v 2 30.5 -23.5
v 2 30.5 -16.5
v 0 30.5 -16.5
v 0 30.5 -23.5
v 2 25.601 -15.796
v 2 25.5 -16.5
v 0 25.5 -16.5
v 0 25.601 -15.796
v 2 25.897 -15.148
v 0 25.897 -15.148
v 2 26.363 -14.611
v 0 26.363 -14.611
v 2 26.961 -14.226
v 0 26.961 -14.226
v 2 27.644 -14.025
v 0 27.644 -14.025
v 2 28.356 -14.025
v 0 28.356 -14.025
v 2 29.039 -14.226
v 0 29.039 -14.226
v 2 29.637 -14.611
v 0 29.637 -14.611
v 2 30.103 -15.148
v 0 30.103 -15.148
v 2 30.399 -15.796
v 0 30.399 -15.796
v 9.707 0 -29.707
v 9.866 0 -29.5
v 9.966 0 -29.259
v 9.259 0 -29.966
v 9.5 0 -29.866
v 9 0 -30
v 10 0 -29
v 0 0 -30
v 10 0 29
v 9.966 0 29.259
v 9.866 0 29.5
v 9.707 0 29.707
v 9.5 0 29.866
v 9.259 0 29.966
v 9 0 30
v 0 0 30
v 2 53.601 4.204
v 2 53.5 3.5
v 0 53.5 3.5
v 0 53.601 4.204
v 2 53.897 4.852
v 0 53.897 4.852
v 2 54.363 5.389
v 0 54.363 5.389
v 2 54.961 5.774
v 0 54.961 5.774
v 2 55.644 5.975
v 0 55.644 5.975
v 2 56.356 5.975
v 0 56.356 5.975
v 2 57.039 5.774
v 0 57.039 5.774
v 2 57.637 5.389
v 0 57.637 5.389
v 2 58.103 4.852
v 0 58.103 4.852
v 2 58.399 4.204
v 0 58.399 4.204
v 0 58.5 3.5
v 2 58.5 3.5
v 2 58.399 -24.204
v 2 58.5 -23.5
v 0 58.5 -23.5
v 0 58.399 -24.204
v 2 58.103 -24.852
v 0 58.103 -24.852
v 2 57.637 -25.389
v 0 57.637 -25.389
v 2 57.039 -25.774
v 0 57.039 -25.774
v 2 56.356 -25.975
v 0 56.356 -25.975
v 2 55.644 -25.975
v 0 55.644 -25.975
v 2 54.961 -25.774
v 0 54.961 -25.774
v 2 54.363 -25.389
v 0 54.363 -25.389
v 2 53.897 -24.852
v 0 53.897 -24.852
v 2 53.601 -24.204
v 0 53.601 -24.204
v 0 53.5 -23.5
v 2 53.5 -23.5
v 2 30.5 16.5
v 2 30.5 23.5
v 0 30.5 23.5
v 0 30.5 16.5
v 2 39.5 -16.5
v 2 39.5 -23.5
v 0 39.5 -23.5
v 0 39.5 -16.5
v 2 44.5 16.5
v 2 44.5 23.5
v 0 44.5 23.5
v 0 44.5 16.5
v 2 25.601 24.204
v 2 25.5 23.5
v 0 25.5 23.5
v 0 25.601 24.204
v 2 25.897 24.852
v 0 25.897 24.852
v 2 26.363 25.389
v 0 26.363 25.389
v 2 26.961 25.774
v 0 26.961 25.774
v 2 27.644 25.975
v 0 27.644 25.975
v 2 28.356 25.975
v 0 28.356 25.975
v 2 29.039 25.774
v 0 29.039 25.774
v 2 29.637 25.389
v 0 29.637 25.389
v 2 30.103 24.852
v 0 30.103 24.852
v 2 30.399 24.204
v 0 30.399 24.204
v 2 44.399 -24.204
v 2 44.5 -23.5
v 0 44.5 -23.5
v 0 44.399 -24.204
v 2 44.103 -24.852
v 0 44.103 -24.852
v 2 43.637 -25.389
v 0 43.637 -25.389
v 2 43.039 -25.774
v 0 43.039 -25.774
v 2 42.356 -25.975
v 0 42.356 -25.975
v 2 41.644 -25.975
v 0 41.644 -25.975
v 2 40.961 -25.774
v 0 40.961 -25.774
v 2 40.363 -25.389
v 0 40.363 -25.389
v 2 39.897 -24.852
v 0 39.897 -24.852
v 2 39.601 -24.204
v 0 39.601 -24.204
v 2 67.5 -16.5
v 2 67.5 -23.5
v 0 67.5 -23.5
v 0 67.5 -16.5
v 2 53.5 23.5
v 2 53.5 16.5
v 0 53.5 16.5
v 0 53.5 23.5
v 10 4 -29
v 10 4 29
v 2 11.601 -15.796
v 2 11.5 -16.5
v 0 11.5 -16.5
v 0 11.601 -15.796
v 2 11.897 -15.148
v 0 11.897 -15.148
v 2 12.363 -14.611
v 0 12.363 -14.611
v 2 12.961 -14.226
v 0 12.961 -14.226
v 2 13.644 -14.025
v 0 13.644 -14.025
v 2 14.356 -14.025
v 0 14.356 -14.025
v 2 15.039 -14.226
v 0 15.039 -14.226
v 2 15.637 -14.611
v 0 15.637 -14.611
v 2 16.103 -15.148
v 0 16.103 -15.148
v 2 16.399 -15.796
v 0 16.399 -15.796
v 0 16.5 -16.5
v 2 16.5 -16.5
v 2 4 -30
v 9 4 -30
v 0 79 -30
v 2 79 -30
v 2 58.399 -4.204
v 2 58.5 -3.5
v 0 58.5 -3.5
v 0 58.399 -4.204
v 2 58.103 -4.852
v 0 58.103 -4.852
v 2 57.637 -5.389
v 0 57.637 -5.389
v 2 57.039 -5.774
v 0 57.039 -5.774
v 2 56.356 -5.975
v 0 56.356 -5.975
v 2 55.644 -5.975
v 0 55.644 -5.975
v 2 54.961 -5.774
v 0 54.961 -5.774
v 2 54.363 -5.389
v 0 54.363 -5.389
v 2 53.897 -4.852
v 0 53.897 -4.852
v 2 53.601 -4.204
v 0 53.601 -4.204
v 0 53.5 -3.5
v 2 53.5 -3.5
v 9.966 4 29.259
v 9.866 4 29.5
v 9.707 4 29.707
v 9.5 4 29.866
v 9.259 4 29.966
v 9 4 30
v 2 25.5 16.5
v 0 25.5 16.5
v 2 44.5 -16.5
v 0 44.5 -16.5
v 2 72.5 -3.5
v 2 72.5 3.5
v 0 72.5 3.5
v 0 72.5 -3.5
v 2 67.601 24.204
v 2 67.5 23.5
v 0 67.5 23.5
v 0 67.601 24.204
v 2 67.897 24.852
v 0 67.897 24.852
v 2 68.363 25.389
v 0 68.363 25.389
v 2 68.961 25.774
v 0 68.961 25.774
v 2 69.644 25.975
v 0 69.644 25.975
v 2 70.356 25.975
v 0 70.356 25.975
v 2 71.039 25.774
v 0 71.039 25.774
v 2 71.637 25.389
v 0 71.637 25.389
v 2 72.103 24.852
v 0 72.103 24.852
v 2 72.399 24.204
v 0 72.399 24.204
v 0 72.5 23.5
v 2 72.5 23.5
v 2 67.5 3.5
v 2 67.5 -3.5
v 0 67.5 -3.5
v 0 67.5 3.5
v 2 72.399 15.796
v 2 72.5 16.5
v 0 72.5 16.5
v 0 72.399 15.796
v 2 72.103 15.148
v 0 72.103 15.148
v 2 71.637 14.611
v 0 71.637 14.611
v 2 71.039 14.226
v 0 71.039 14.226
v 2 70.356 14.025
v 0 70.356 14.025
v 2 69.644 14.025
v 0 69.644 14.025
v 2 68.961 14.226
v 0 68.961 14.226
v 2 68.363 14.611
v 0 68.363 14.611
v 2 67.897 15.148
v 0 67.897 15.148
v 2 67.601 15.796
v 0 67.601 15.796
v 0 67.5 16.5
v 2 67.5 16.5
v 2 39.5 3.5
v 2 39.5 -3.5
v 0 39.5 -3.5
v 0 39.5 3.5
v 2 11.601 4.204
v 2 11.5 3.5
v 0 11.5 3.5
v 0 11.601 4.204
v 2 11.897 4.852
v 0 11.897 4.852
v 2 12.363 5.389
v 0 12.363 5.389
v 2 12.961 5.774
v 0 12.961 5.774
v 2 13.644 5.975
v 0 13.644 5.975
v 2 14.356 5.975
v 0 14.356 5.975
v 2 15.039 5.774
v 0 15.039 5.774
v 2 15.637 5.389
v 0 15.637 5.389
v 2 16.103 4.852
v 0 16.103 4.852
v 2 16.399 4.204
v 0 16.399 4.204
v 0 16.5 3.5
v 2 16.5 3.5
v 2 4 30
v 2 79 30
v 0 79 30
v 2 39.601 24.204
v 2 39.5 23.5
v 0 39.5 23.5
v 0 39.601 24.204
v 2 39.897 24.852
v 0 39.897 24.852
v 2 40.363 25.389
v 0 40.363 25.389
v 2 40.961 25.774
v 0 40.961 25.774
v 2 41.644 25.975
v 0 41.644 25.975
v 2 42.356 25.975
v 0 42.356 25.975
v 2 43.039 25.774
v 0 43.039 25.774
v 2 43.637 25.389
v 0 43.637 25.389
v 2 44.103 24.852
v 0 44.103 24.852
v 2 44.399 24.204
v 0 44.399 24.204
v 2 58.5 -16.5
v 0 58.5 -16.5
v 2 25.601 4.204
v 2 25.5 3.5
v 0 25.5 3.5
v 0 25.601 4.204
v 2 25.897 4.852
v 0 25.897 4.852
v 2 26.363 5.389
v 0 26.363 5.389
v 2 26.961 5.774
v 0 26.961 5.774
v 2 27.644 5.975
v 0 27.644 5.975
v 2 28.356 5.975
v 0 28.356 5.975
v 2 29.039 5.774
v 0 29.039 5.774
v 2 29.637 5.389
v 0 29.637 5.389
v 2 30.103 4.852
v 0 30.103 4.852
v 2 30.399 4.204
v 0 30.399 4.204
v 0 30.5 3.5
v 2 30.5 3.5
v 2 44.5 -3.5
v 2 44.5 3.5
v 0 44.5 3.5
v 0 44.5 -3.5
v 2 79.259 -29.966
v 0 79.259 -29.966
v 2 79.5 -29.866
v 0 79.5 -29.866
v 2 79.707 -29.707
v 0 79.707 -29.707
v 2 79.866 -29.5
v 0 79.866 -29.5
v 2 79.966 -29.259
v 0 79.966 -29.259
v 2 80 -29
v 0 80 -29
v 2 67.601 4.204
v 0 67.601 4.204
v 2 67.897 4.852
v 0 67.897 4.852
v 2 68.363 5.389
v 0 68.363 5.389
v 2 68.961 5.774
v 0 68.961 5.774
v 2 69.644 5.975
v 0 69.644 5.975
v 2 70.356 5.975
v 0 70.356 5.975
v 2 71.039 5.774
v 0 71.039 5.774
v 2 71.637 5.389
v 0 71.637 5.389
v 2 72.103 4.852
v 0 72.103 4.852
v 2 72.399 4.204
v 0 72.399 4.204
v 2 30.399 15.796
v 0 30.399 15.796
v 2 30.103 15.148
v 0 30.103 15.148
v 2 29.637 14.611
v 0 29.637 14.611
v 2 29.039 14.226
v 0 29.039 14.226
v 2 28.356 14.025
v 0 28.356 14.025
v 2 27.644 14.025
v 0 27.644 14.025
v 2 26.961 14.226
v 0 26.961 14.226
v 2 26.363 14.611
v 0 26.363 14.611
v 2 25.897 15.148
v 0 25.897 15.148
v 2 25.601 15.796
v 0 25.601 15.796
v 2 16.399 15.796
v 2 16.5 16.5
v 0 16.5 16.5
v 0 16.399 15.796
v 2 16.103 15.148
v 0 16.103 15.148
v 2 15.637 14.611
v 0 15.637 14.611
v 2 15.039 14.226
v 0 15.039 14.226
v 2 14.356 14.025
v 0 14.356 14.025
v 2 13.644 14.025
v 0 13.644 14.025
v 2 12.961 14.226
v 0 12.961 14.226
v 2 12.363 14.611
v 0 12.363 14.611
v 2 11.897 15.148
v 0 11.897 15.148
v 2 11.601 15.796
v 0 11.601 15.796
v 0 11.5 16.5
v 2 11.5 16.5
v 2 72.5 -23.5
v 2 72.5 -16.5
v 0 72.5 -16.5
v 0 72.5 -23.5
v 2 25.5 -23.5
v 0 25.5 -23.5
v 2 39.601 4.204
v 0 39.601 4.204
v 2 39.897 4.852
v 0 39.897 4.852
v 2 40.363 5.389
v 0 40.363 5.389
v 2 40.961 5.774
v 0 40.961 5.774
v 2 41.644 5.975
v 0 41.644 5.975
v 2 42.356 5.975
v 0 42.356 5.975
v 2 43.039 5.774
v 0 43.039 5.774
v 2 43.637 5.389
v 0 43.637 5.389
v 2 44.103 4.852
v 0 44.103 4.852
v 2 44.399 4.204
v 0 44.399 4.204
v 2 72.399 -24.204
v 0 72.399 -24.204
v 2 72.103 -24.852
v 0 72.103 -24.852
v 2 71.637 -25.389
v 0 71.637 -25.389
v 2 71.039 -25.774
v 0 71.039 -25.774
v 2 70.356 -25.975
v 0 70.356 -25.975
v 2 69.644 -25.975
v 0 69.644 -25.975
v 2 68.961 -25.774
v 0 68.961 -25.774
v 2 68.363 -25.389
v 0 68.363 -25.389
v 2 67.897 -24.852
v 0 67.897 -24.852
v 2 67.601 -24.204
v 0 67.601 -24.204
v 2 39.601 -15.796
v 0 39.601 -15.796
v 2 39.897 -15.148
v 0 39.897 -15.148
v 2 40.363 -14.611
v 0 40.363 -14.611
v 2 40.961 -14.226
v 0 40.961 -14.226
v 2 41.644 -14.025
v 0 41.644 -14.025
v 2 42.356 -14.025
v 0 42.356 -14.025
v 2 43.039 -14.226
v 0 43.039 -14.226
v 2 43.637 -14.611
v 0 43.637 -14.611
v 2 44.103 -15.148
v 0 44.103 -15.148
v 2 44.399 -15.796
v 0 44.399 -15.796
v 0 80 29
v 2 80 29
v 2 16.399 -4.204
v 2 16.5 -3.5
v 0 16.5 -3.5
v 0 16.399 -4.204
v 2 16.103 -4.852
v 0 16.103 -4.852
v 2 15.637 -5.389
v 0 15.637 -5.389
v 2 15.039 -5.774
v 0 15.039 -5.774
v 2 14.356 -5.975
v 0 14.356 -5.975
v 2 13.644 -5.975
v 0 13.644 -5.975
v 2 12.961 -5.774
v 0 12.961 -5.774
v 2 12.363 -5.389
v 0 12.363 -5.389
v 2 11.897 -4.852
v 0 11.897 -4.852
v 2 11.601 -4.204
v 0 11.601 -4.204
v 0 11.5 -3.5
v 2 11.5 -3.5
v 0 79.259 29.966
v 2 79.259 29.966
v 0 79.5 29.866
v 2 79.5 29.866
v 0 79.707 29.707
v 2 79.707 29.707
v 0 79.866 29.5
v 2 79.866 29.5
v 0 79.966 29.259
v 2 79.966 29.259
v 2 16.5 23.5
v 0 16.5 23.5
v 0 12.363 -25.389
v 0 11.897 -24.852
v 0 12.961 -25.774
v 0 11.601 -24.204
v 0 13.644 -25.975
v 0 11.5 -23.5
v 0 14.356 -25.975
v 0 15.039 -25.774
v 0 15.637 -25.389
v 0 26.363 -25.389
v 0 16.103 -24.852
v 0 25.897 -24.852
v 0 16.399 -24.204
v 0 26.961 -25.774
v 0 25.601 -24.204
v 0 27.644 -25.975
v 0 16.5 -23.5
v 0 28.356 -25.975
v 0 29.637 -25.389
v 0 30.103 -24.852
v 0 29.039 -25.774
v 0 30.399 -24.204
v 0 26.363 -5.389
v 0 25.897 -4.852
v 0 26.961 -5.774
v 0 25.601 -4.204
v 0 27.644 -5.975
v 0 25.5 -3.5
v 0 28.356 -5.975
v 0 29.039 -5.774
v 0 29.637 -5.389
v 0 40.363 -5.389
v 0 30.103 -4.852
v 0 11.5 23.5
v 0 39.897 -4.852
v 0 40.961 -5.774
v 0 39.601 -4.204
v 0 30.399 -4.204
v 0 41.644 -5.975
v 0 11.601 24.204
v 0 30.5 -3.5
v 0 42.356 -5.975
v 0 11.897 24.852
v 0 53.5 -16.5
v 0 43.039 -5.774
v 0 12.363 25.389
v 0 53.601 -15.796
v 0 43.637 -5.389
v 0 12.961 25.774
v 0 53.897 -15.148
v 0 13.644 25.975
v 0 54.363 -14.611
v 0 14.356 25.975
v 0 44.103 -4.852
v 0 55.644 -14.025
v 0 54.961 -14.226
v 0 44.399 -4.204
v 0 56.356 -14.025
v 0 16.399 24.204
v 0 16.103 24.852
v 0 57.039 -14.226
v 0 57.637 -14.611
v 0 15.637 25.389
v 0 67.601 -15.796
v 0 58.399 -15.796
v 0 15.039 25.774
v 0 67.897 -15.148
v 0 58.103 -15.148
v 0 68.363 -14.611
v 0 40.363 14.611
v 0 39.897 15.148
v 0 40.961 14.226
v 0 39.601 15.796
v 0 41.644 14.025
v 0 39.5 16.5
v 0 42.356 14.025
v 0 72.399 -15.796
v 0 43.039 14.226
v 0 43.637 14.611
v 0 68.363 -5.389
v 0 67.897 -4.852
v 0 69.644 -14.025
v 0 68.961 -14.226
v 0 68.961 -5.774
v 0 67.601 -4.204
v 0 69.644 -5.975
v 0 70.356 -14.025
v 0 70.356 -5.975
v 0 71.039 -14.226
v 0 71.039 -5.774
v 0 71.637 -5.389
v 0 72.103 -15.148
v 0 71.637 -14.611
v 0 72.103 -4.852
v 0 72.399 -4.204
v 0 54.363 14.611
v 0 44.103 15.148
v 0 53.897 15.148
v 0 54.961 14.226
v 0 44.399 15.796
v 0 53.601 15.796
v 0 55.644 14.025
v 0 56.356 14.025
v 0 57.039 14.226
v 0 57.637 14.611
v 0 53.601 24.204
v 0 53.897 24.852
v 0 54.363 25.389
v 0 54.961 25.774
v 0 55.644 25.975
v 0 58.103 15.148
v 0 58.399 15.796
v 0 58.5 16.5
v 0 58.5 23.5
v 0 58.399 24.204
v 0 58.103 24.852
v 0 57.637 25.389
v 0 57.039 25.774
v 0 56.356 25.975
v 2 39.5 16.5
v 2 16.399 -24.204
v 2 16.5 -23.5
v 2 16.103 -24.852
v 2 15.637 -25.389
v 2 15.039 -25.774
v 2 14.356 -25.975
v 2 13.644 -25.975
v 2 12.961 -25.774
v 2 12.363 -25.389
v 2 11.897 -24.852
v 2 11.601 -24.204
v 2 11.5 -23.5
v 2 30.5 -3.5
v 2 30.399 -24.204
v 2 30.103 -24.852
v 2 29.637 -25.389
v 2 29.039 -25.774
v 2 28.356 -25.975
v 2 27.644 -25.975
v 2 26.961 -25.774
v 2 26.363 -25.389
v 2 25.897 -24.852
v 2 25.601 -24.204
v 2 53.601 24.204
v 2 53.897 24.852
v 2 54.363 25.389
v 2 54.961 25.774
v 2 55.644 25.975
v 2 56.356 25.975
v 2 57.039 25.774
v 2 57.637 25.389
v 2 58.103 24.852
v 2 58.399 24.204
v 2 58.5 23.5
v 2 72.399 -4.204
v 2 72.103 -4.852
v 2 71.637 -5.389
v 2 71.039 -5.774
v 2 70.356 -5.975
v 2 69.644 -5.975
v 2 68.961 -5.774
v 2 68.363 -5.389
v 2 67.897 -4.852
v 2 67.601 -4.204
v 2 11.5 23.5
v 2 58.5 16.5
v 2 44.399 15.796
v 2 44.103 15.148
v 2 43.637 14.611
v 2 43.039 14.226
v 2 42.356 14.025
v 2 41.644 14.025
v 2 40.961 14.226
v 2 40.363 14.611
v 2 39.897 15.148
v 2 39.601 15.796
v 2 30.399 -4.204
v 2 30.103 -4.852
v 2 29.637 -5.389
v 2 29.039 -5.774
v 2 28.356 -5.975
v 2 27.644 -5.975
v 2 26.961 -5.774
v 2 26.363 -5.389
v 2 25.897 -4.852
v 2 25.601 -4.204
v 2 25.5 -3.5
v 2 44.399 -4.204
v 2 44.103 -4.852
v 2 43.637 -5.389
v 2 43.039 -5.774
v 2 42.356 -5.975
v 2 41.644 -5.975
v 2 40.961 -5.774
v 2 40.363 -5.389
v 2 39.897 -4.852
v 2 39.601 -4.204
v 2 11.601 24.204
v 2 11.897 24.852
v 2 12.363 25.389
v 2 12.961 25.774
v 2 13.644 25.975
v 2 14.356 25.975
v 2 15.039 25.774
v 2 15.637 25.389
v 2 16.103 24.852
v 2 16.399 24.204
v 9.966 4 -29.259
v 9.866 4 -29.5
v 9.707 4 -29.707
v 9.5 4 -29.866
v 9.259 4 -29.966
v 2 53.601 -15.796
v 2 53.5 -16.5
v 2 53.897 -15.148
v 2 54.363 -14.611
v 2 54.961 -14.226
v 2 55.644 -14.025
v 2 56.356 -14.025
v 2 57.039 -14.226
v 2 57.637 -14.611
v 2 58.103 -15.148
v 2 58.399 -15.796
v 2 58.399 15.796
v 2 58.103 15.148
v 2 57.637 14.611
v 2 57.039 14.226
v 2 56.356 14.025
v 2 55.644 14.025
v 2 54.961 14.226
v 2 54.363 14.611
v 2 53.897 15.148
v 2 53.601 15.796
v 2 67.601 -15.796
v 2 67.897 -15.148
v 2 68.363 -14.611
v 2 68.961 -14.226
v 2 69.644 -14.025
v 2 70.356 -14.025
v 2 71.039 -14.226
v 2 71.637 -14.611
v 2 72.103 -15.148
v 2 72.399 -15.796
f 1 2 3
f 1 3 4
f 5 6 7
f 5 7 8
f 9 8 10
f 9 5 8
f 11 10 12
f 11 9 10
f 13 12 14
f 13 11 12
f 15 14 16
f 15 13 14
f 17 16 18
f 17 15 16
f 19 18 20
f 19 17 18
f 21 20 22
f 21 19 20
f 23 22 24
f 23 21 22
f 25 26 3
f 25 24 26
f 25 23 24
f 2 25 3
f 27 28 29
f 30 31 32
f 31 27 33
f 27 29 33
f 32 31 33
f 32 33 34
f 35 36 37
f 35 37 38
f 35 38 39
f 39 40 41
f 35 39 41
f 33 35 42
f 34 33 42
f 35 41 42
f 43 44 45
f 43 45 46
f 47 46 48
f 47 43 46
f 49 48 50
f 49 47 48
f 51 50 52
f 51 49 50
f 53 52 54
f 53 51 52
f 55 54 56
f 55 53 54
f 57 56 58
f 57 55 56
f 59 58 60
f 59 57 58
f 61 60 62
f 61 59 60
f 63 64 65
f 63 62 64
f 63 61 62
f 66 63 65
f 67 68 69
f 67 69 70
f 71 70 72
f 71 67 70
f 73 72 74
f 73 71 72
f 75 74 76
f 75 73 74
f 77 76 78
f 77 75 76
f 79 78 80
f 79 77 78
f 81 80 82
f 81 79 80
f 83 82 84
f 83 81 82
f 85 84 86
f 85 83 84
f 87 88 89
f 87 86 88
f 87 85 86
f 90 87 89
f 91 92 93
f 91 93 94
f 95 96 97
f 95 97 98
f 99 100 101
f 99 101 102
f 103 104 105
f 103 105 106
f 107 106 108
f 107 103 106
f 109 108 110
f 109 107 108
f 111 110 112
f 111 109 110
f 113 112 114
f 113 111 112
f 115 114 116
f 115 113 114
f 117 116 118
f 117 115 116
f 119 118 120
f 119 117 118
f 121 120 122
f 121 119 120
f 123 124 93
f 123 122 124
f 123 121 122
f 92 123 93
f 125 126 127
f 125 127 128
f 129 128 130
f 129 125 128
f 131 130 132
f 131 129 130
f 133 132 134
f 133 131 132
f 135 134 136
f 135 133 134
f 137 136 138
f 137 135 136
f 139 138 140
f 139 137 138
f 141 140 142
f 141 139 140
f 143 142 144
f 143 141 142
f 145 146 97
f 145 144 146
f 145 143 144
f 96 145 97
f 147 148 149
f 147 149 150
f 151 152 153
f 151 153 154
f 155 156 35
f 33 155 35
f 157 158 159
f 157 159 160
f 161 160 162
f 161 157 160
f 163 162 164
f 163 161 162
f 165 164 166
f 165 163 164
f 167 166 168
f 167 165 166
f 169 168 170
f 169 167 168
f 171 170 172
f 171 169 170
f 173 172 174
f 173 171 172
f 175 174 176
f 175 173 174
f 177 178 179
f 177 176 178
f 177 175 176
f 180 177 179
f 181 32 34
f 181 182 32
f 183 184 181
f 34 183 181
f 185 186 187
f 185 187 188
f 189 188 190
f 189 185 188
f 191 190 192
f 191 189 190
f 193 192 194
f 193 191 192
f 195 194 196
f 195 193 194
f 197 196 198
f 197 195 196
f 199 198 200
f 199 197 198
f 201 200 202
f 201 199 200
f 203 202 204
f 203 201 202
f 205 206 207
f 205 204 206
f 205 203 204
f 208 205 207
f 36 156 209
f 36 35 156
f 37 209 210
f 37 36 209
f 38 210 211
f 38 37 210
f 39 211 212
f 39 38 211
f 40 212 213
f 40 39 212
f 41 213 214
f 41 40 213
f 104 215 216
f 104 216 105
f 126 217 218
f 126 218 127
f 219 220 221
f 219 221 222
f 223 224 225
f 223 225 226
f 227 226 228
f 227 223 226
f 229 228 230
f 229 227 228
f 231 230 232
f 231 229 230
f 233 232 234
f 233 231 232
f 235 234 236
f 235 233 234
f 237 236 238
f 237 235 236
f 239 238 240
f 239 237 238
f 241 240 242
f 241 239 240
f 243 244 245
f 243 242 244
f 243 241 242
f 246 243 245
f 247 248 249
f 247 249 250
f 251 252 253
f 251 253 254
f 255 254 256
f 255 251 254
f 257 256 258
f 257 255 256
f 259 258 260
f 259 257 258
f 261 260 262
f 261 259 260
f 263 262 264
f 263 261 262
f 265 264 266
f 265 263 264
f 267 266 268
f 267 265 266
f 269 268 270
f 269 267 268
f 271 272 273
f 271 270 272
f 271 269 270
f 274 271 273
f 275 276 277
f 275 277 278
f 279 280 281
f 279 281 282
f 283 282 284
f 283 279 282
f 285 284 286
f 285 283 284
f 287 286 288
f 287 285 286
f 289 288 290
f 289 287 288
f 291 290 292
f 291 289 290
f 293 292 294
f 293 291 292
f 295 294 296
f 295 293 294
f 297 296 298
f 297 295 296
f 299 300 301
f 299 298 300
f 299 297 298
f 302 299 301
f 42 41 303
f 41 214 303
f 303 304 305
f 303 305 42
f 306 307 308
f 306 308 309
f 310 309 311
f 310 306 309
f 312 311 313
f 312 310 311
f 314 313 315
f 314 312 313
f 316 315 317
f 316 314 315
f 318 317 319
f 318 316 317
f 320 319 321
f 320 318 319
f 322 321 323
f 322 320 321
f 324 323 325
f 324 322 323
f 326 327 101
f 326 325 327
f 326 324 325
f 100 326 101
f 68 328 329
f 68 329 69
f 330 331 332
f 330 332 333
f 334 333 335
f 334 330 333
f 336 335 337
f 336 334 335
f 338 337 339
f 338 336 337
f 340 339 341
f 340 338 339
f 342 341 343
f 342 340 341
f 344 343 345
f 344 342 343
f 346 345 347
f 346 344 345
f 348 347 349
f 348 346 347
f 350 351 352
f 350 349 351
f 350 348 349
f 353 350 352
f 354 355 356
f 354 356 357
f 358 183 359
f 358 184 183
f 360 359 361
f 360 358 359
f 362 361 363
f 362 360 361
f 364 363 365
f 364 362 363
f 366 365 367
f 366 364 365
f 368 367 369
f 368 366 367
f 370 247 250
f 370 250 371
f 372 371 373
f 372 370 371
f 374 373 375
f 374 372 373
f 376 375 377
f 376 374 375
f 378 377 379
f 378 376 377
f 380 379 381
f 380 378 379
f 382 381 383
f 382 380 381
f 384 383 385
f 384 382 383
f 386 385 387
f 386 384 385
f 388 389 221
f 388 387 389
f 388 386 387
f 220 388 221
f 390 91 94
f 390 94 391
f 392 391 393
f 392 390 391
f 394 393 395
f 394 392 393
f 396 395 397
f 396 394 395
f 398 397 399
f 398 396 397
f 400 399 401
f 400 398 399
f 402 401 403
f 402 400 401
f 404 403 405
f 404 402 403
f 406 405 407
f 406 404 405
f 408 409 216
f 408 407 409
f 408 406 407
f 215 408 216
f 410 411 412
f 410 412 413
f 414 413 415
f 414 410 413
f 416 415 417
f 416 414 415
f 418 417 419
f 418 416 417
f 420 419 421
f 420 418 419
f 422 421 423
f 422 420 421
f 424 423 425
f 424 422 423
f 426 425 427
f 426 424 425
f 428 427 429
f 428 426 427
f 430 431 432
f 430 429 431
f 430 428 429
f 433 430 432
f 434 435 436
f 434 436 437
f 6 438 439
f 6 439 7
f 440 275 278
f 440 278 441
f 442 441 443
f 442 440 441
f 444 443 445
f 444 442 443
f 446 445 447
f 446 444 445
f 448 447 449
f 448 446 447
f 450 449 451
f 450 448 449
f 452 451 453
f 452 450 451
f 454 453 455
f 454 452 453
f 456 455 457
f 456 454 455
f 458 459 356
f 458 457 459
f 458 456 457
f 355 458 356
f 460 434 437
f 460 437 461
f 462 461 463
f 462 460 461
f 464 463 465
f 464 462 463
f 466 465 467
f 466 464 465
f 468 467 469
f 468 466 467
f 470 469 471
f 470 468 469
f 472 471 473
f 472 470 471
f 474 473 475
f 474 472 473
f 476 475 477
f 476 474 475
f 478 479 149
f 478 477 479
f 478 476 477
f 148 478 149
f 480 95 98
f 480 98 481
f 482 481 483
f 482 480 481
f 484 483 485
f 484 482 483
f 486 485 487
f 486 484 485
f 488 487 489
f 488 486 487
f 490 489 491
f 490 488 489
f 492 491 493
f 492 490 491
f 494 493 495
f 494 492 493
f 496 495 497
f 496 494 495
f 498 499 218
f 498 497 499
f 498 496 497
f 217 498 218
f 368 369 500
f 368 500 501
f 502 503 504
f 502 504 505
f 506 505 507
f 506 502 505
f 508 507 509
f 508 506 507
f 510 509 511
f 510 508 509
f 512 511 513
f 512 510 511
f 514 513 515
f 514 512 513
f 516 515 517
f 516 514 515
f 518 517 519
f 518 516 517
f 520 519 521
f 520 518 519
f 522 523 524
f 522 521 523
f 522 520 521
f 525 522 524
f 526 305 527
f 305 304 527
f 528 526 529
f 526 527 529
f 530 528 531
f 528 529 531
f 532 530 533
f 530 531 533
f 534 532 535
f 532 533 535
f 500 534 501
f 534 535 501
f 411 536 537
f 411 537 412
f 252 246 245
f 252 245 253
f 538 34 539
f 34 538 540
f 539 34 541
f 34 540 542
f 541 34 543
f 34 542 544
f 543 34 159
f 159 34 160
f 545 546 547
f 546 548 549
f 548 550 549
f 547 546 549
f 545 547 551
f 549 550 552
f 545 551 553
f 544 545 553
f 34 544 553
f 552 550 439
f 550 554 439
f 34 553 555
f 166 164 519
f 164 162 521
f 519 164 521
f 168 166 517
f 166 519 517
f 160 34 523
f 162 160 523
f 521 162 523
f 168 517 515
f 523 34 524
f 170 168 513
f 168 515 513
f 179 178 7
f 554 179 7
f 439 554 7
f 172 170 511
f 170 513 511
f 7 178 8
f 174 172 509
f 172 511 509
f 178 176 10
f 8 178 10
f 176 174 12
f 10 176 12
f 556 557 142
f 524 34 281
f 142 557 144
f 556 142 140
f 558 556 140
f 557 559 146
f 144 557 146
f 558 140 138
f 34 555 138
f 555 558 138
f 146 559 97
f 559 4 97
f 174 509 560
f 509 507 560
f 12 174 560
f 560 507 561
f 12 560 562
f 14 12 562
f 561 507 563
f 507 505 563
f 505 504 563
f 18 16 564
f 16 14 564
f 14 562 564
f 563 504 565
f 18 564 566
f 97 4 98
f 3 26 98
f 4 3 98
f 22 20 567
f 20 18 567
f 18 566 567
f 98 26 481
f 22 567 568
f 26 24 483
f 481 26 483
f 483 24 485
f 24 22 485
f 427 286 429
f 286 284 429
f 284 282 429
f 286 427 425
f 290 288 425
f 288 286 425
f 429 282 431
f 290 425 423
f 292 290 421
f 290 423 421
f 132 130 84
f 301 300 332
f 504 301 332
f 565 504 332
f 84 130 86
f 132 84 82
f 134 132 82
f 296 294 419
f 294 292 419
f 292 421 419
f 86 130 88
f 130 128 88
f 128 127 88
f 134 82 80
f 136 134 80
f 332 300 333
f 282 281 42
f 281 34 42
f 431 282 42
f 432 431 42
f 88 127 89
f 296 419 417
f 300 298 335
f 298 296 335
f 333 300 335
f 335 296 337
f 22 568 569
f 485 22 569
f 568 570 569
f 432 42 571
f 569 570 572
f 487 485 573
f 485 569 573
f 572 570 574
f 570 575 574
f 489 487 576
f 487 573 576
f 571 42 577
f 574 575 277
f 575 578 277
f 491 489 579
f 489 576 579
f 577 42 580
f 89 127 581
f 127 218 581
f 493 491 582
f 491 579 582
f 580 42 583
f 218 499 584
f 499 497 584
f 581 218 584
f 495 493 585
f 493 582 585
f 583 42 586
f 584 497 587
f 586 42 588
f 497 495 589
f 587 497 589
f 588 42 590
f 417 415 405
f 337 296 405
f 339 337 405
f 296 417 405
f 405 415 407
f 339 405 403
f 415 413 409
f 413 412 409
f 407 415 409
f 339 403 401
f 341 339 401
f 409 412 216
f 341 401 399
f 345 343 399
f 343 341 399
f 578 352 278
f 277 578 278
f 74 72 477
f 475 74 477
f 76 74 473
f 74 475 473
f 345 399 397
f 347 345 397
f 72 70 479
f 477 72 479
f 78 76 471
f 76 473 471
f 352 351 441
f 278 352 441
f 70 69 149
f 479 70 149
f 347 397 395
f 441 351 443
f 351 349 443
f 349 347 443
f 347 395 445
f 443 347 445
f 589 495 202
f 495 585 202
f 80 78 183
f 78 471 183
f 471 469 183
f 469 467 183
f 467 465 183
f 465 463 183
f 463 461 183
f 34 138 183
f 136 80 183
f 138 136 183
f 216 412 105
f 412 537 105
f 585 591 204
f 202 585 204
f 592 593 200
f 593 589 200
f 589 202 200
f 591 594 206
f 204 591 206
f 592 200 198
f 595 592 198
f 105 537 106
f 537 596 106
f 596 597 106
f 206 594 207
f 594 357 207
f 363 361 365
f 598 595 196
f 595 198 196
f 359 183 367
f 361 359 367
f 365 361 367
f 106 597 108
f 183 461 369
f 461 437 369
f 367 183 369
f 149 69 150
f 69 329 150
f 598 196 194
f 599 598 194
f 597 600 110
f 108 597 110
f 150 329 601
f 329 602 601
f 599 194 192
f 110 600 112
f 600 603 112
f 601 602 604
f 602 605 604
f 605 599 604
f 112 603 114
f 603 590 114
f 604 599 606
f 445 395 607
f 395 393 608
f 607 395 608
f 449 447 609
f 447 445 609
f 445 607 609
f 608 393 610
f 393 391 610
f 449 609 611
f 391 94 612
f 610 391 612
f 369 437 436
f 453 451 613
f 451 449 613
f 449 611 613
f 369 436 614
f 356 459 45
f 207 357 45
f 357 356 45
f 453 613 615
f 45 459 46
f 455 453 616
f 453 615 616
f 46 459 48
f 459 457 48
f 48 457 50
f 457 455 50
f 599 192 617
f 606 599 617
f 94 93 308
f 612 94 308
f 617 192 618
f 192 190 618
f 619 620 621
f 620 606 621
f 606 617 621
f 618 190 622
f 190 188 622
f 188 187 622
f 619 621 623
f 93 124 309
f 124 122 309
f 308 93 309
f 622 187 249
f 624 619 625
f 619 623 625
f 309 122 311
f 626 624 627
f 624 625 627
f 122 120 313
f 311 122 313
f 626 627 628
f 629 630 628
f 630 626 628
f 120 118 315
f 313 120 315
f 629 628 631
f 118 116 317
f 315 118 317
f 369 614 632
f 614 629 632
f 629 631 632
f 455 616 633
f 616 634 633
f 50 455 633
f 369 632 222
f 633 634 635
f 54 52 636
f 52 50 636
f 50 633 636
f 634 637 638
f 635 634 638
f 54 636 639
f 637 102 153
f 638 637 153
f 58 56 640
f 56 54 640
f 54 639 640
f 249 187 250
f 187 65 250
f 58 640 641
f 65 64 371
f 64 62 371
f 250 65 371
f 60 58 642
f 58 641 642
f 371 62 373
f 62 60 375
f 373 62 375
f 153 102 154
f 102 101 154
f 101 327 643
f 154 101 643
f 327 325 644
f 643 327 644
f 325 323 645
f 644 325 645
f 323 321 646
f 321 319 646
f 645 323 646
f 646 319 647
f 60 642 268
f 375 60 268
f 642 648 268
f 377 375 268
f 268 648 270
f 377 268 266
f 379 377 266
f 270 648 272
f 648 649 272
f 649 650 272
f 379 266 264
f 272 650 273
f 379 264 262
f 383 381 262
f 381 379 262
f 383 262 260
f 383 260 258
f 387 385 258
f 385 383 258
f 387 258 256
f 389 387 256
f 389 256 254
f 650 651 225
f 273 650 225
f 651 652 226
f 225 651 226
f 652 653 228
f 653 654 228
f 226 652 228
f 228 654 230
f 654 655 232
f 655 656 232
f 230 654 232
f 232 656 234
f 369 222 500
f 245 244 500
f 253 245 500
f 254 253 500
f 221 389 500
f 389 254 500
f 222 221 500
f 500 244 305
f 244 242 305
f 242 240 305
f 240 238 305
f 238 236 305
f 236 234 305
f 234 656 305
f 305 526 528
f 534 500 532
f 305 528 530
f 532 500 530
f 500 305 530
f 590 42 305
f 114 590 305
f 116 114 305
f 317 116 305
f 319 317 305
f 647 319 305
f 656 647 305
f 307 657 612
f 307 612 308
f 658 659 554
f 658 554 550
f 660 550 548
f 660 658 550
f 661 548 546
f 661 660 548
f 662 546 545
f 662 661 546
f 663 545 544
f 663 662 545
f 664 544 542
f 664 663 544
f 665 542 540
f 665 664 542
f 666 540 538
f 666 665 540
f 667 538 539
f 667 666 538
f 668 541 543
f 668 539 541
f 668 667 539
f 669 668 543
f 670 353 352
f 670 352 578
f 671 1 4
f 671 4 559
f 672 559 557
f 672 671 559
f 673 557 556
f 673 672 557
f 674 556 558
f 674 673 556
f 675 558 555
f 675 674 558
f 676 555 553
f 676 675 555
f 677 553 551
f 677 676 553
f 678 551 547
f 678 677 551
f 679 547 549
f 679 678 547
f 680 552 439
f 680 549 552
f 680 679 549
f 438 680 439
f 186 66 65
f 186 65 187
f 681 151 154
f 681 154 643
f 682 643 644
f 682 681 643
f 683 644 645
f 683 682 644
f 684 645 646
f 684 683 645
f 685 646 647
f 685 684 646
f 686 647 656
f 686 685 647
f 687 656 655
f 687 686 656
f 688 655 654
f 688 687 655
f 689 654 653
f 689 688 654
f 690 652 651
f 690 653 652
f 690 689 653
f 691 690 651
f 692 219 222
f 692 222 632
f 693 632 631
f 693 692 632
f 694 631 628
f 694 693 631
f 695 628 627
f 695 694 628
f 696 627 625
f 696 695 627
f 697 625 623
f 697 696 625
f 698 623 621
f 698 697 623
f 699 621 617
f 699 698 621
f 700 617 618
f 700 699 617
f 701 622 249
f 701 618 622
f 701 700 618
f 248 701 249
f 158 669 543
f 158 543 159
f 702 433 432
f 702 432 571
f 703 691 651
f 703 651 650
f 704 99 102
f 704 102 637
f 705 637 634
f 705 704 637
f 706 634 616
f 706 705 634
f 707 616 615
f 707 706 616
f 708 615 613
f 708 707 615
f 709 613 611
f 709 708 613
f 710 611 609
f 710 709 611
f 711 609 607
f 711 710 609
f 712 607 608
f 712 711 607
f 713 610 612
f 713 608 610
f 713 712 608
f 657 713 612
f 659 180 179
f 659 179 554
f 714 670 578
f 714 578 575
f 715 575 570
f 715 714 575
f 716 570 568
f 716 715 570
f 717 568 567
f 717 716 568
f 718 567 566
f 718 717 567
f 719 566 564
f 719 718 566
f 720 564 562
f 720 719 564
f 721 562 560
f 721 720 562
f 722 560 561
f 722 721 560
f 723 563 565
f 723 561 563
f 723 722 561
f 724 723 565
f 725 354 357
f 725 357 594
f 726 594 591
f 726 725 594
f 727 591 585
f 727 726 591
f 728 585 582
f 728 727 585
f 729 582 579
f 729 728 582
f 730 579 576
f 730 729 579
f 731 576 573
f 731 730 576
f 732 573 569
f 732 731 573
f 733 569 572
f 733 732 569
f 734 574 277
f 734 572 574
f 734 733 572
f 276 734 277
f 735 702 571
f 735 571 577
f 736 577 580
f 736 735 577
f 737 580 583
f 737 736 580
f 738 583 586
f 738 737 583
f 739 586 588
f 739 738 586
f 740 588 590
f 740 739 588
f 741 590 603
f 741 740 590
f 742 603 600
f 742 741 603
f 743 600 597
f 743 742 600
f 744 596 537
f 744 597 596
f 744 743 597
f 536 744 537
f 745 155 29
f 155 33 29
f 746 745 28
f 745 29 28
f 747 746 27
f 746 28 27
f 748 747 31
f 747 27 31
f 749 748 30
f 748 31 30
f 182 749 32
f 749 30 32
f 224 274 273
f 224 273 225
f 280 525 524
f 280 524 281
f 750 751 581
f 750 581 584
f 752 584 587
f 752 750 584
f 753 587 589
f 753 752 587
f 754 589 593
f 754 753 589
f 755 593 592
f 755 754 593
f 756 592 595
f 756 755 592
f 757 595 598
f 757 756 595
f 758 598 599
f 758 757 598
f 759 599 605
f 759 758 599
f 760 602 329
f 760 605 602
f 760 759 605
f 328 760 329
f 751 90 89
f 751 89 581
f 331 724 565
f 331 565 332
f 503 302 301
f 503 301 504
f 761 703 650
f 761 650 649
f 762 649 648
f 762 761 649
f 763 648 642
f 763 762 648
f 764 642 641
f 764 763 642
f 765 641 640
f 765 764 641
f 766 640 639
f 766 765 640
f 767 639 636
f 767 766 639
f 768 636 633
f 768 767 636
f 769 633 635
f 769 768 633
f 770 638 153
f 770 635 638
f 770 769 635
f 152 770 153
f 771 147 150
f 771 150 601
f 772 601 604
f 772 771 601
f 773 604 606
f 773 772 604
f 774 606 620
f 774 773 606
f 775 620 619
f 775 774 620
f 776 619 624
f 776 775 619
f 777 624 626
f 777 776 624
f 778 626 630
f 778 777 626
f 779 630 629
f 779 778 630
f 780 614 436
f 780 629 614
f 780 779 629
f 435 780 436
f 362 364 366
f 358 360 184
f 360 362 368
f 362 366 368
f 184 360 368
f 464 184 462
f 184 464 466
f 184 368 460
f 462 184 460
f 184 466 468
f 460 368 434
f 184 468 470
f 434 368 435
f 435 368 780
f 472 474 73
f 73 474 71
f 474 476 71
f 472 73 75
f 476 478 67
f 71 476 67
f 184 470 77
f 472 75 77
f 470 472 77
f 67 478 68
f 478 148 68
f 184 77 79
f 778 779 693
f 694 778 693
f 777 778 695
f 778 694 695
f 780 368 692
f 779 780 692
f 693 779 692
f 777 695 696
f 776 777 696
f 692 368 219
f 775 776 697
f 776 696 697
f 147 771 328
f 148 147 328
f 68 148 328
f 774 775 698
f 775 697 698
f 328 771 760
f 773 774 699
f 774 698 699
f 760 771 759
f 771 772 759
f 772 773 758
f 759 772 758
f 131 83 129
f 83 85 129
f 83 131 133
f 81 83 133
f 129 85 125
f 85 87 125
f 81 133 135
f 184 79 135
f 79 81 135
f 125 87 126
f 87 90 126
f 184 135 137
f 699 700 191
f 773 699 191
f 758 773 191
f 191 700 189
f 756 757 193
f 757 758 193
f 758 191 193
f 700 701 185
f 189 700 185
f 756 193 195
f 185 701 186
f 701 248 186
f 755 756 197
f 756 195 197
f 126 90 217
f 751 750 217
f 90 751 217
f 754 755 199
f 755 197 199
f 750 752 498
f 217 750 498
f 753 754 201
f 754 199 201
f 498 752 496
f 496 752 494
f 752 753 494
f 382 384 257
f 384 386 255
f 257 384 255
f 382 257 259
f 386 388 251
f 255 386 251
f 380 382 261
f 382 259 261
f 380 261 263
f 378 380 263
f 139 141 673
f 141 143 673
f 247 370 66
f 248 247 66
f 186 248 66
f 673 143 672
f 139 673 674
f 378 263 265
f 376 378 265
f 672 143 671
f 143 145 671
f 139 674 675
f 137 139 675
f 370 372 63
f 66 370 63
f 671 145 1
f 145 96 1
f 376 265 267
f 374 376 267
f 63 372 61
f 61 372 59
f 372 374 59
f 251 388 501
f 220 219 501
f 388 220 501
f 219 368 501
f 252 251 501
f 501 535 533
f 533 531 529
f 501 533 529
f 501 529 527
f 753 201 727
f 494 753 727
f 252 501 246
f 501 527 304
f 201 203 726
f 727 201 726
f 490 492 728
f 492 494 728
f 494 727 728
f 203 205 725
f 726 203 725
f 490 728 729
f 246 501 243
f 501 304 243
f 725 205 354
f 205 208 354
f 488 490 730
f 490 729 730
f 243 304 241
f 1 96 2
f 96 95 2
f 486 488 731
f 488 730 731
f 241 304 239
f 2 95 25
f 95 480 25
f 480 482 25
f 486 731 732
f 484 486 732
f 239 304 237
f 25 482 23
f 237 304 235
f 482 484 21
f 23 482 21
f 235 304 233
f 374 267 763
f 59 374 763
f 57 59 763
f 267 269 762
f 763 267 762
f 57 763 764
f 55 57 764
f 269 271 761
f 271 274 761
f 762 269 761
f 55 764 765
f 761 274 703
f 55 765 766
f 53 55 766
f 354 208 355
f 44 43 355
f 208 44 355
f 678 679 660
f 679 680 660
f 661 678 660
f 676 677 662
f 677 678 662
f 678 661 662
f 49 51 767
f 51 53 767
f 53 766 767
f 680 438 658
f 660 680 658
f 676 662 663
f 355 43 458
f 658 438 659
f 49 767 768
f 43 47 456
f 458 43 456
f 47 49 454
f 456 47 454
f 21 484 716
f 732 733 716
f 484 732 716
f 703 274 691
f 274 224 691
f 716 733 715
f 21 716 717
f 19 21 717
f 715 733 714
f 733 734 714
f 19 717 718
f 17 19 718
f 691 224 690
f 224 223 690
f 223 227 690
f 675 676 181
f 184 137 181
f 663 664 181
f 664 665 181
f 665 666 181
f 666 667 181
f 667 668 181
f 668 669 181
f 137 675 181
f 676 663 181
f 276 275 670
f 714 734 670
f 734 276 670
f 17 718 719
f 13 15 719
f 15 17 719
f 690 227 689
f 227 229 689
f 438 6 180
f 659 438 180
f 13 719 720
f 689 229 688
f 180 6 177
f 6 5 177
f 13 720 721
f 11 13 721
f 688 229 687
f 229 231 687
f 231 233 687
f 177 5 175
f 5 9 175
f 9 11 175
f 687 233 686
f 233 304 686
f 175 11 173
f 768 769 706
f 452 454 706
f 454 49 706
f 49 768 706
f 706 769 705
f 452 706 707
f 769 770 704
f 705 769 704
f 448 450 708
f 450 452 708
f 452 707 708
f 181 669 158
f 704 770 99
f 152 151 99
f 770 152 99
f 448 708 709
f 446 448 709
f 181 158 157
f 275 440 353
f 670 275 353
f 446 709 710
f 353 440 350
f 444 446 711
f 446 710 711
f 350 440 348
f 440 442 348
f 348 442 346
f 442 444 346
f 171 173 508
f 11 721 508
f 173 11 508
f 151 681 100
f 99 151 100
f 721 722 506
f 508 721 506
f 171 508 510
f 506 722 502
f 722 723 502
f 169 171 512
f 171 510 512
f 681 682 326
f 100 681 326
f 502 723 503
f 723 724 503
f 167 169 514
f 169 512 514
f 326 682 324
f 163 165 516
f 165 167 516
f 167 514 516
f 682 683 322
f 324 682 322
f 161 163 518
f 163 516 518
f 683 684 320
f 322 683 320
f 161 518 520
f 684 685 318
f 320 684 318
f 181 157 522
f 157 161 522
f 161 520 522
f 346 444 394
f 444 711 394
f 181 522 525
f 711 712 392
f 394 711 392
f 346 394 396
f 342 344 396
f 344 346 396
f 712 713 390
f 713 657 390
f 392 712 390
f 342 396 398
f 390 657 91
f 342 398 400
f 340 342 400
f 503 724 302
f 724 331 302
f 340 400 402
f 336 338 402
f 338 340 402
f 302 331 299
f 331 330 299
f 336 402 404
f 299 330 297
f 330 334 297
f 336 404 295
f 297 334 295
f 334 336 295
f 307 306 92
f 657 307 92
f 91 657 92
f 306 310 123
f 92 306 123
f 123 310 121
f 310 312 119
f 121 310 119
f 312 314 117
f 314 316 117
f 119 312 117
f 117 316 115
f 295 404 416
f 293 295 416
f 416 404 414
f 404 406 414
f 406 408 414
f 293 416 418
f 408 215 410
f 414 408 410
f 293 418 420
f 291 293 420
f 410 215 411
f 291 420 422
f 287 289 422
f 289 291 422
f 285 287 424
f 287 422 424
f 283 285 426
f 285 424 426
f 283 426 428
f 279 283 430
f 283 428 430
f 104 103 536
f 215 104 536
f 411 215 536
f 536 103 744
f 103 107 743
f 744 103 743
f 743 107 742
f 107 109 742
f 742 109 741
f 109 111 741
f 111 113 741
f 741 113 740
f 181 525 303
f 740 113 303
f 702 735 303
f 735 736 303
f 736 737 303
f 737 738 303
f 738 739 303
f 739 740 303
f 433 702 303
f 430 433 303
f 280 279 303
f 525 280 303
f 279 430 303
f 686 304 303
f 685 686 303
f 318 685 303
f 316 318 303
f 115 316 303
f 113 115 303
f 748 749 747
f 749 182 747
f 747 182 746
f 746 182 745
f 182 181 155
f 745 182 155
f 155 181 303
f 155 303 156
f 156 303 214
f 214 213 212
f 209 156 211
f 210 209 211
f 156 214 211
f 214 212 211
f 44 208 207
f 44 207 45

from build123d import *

# Parameters (mm, degrees)
P_IDAT_VYSUNUT_M1_DEPTH  = 30
ODEBRAT_VYSUNUT_M1_DEPTH = 86.813751812
LINPOLE1_COUNT           = 3
LINPOLE1_PITCH           = 20
LINPOLE1_COUNT_DIR2      = 6
LINPOLE1_PITCH_DIR2      = 14
ZAOBLIT1_R               = 1


with BuildPart() as part:
    # Skica1 → Přidat vysunutím1 (new, symmetric)
    with BuildSketch(Plane.XY):
        Polygon((10, 0), (0, 0), (0, 80), (2, 80), (2, 4), (10, 4), align=None)
    extrude(amount=P_IDAT_VYSUNUT_M1_DEPTH, both=True)

    # Skica2 → Odebrat vysunutím1 (cut, through all)
    with BuildSketch(Plane(origin=(2, 0, 0), x_dir=(0, 0, -1), z_dir=(1, 0, 0))):
        with BuildLine():
            Line((-23.5, 16.5), (-16.5, 16.5))
            ThreePointArc((-16.5, 16.5), (-14, 14), (-16.5, 11.5))
            Line((-16.5, 11.5), (-23.5, 11.5))
            ThreePointArc((-23.5, 11.5), (-26, 14), (-23.5, 16.5))
        make_face()
    odebrat_vysunut_m1 = extrude(amount=-ODEBRAT_VYSUNUT_M1_DEPTH, mode=Mode.SUBTRACT)

    # LinPole1: Odebrat vysunut_m1 3 × 6
    with Locations(*[(0, j * LINPOLE1_PITCH_DIR2, -i * LINPOLE1_PITCH) for i in range(LINPOLE1_COUNT) for j in range(LINPOLE1_COUNT_DIR2) if (i, j) != (0, 0)]):
        add(odebrat_vysunut_m1, mode=Mode.SUBTRACT)

    # Zaoblit1
    zaoblit1_edges = [part.edges().sort_by_distance(p)[0] for p in [
        (1, 80, 30),
        (10, 2, 30),
        (1, 80, -30),
        (10, 2, -30),
    ]]
    fillet(zaoblit1_edges, radius=ZAOBLIT1_R)


solid = part.part
